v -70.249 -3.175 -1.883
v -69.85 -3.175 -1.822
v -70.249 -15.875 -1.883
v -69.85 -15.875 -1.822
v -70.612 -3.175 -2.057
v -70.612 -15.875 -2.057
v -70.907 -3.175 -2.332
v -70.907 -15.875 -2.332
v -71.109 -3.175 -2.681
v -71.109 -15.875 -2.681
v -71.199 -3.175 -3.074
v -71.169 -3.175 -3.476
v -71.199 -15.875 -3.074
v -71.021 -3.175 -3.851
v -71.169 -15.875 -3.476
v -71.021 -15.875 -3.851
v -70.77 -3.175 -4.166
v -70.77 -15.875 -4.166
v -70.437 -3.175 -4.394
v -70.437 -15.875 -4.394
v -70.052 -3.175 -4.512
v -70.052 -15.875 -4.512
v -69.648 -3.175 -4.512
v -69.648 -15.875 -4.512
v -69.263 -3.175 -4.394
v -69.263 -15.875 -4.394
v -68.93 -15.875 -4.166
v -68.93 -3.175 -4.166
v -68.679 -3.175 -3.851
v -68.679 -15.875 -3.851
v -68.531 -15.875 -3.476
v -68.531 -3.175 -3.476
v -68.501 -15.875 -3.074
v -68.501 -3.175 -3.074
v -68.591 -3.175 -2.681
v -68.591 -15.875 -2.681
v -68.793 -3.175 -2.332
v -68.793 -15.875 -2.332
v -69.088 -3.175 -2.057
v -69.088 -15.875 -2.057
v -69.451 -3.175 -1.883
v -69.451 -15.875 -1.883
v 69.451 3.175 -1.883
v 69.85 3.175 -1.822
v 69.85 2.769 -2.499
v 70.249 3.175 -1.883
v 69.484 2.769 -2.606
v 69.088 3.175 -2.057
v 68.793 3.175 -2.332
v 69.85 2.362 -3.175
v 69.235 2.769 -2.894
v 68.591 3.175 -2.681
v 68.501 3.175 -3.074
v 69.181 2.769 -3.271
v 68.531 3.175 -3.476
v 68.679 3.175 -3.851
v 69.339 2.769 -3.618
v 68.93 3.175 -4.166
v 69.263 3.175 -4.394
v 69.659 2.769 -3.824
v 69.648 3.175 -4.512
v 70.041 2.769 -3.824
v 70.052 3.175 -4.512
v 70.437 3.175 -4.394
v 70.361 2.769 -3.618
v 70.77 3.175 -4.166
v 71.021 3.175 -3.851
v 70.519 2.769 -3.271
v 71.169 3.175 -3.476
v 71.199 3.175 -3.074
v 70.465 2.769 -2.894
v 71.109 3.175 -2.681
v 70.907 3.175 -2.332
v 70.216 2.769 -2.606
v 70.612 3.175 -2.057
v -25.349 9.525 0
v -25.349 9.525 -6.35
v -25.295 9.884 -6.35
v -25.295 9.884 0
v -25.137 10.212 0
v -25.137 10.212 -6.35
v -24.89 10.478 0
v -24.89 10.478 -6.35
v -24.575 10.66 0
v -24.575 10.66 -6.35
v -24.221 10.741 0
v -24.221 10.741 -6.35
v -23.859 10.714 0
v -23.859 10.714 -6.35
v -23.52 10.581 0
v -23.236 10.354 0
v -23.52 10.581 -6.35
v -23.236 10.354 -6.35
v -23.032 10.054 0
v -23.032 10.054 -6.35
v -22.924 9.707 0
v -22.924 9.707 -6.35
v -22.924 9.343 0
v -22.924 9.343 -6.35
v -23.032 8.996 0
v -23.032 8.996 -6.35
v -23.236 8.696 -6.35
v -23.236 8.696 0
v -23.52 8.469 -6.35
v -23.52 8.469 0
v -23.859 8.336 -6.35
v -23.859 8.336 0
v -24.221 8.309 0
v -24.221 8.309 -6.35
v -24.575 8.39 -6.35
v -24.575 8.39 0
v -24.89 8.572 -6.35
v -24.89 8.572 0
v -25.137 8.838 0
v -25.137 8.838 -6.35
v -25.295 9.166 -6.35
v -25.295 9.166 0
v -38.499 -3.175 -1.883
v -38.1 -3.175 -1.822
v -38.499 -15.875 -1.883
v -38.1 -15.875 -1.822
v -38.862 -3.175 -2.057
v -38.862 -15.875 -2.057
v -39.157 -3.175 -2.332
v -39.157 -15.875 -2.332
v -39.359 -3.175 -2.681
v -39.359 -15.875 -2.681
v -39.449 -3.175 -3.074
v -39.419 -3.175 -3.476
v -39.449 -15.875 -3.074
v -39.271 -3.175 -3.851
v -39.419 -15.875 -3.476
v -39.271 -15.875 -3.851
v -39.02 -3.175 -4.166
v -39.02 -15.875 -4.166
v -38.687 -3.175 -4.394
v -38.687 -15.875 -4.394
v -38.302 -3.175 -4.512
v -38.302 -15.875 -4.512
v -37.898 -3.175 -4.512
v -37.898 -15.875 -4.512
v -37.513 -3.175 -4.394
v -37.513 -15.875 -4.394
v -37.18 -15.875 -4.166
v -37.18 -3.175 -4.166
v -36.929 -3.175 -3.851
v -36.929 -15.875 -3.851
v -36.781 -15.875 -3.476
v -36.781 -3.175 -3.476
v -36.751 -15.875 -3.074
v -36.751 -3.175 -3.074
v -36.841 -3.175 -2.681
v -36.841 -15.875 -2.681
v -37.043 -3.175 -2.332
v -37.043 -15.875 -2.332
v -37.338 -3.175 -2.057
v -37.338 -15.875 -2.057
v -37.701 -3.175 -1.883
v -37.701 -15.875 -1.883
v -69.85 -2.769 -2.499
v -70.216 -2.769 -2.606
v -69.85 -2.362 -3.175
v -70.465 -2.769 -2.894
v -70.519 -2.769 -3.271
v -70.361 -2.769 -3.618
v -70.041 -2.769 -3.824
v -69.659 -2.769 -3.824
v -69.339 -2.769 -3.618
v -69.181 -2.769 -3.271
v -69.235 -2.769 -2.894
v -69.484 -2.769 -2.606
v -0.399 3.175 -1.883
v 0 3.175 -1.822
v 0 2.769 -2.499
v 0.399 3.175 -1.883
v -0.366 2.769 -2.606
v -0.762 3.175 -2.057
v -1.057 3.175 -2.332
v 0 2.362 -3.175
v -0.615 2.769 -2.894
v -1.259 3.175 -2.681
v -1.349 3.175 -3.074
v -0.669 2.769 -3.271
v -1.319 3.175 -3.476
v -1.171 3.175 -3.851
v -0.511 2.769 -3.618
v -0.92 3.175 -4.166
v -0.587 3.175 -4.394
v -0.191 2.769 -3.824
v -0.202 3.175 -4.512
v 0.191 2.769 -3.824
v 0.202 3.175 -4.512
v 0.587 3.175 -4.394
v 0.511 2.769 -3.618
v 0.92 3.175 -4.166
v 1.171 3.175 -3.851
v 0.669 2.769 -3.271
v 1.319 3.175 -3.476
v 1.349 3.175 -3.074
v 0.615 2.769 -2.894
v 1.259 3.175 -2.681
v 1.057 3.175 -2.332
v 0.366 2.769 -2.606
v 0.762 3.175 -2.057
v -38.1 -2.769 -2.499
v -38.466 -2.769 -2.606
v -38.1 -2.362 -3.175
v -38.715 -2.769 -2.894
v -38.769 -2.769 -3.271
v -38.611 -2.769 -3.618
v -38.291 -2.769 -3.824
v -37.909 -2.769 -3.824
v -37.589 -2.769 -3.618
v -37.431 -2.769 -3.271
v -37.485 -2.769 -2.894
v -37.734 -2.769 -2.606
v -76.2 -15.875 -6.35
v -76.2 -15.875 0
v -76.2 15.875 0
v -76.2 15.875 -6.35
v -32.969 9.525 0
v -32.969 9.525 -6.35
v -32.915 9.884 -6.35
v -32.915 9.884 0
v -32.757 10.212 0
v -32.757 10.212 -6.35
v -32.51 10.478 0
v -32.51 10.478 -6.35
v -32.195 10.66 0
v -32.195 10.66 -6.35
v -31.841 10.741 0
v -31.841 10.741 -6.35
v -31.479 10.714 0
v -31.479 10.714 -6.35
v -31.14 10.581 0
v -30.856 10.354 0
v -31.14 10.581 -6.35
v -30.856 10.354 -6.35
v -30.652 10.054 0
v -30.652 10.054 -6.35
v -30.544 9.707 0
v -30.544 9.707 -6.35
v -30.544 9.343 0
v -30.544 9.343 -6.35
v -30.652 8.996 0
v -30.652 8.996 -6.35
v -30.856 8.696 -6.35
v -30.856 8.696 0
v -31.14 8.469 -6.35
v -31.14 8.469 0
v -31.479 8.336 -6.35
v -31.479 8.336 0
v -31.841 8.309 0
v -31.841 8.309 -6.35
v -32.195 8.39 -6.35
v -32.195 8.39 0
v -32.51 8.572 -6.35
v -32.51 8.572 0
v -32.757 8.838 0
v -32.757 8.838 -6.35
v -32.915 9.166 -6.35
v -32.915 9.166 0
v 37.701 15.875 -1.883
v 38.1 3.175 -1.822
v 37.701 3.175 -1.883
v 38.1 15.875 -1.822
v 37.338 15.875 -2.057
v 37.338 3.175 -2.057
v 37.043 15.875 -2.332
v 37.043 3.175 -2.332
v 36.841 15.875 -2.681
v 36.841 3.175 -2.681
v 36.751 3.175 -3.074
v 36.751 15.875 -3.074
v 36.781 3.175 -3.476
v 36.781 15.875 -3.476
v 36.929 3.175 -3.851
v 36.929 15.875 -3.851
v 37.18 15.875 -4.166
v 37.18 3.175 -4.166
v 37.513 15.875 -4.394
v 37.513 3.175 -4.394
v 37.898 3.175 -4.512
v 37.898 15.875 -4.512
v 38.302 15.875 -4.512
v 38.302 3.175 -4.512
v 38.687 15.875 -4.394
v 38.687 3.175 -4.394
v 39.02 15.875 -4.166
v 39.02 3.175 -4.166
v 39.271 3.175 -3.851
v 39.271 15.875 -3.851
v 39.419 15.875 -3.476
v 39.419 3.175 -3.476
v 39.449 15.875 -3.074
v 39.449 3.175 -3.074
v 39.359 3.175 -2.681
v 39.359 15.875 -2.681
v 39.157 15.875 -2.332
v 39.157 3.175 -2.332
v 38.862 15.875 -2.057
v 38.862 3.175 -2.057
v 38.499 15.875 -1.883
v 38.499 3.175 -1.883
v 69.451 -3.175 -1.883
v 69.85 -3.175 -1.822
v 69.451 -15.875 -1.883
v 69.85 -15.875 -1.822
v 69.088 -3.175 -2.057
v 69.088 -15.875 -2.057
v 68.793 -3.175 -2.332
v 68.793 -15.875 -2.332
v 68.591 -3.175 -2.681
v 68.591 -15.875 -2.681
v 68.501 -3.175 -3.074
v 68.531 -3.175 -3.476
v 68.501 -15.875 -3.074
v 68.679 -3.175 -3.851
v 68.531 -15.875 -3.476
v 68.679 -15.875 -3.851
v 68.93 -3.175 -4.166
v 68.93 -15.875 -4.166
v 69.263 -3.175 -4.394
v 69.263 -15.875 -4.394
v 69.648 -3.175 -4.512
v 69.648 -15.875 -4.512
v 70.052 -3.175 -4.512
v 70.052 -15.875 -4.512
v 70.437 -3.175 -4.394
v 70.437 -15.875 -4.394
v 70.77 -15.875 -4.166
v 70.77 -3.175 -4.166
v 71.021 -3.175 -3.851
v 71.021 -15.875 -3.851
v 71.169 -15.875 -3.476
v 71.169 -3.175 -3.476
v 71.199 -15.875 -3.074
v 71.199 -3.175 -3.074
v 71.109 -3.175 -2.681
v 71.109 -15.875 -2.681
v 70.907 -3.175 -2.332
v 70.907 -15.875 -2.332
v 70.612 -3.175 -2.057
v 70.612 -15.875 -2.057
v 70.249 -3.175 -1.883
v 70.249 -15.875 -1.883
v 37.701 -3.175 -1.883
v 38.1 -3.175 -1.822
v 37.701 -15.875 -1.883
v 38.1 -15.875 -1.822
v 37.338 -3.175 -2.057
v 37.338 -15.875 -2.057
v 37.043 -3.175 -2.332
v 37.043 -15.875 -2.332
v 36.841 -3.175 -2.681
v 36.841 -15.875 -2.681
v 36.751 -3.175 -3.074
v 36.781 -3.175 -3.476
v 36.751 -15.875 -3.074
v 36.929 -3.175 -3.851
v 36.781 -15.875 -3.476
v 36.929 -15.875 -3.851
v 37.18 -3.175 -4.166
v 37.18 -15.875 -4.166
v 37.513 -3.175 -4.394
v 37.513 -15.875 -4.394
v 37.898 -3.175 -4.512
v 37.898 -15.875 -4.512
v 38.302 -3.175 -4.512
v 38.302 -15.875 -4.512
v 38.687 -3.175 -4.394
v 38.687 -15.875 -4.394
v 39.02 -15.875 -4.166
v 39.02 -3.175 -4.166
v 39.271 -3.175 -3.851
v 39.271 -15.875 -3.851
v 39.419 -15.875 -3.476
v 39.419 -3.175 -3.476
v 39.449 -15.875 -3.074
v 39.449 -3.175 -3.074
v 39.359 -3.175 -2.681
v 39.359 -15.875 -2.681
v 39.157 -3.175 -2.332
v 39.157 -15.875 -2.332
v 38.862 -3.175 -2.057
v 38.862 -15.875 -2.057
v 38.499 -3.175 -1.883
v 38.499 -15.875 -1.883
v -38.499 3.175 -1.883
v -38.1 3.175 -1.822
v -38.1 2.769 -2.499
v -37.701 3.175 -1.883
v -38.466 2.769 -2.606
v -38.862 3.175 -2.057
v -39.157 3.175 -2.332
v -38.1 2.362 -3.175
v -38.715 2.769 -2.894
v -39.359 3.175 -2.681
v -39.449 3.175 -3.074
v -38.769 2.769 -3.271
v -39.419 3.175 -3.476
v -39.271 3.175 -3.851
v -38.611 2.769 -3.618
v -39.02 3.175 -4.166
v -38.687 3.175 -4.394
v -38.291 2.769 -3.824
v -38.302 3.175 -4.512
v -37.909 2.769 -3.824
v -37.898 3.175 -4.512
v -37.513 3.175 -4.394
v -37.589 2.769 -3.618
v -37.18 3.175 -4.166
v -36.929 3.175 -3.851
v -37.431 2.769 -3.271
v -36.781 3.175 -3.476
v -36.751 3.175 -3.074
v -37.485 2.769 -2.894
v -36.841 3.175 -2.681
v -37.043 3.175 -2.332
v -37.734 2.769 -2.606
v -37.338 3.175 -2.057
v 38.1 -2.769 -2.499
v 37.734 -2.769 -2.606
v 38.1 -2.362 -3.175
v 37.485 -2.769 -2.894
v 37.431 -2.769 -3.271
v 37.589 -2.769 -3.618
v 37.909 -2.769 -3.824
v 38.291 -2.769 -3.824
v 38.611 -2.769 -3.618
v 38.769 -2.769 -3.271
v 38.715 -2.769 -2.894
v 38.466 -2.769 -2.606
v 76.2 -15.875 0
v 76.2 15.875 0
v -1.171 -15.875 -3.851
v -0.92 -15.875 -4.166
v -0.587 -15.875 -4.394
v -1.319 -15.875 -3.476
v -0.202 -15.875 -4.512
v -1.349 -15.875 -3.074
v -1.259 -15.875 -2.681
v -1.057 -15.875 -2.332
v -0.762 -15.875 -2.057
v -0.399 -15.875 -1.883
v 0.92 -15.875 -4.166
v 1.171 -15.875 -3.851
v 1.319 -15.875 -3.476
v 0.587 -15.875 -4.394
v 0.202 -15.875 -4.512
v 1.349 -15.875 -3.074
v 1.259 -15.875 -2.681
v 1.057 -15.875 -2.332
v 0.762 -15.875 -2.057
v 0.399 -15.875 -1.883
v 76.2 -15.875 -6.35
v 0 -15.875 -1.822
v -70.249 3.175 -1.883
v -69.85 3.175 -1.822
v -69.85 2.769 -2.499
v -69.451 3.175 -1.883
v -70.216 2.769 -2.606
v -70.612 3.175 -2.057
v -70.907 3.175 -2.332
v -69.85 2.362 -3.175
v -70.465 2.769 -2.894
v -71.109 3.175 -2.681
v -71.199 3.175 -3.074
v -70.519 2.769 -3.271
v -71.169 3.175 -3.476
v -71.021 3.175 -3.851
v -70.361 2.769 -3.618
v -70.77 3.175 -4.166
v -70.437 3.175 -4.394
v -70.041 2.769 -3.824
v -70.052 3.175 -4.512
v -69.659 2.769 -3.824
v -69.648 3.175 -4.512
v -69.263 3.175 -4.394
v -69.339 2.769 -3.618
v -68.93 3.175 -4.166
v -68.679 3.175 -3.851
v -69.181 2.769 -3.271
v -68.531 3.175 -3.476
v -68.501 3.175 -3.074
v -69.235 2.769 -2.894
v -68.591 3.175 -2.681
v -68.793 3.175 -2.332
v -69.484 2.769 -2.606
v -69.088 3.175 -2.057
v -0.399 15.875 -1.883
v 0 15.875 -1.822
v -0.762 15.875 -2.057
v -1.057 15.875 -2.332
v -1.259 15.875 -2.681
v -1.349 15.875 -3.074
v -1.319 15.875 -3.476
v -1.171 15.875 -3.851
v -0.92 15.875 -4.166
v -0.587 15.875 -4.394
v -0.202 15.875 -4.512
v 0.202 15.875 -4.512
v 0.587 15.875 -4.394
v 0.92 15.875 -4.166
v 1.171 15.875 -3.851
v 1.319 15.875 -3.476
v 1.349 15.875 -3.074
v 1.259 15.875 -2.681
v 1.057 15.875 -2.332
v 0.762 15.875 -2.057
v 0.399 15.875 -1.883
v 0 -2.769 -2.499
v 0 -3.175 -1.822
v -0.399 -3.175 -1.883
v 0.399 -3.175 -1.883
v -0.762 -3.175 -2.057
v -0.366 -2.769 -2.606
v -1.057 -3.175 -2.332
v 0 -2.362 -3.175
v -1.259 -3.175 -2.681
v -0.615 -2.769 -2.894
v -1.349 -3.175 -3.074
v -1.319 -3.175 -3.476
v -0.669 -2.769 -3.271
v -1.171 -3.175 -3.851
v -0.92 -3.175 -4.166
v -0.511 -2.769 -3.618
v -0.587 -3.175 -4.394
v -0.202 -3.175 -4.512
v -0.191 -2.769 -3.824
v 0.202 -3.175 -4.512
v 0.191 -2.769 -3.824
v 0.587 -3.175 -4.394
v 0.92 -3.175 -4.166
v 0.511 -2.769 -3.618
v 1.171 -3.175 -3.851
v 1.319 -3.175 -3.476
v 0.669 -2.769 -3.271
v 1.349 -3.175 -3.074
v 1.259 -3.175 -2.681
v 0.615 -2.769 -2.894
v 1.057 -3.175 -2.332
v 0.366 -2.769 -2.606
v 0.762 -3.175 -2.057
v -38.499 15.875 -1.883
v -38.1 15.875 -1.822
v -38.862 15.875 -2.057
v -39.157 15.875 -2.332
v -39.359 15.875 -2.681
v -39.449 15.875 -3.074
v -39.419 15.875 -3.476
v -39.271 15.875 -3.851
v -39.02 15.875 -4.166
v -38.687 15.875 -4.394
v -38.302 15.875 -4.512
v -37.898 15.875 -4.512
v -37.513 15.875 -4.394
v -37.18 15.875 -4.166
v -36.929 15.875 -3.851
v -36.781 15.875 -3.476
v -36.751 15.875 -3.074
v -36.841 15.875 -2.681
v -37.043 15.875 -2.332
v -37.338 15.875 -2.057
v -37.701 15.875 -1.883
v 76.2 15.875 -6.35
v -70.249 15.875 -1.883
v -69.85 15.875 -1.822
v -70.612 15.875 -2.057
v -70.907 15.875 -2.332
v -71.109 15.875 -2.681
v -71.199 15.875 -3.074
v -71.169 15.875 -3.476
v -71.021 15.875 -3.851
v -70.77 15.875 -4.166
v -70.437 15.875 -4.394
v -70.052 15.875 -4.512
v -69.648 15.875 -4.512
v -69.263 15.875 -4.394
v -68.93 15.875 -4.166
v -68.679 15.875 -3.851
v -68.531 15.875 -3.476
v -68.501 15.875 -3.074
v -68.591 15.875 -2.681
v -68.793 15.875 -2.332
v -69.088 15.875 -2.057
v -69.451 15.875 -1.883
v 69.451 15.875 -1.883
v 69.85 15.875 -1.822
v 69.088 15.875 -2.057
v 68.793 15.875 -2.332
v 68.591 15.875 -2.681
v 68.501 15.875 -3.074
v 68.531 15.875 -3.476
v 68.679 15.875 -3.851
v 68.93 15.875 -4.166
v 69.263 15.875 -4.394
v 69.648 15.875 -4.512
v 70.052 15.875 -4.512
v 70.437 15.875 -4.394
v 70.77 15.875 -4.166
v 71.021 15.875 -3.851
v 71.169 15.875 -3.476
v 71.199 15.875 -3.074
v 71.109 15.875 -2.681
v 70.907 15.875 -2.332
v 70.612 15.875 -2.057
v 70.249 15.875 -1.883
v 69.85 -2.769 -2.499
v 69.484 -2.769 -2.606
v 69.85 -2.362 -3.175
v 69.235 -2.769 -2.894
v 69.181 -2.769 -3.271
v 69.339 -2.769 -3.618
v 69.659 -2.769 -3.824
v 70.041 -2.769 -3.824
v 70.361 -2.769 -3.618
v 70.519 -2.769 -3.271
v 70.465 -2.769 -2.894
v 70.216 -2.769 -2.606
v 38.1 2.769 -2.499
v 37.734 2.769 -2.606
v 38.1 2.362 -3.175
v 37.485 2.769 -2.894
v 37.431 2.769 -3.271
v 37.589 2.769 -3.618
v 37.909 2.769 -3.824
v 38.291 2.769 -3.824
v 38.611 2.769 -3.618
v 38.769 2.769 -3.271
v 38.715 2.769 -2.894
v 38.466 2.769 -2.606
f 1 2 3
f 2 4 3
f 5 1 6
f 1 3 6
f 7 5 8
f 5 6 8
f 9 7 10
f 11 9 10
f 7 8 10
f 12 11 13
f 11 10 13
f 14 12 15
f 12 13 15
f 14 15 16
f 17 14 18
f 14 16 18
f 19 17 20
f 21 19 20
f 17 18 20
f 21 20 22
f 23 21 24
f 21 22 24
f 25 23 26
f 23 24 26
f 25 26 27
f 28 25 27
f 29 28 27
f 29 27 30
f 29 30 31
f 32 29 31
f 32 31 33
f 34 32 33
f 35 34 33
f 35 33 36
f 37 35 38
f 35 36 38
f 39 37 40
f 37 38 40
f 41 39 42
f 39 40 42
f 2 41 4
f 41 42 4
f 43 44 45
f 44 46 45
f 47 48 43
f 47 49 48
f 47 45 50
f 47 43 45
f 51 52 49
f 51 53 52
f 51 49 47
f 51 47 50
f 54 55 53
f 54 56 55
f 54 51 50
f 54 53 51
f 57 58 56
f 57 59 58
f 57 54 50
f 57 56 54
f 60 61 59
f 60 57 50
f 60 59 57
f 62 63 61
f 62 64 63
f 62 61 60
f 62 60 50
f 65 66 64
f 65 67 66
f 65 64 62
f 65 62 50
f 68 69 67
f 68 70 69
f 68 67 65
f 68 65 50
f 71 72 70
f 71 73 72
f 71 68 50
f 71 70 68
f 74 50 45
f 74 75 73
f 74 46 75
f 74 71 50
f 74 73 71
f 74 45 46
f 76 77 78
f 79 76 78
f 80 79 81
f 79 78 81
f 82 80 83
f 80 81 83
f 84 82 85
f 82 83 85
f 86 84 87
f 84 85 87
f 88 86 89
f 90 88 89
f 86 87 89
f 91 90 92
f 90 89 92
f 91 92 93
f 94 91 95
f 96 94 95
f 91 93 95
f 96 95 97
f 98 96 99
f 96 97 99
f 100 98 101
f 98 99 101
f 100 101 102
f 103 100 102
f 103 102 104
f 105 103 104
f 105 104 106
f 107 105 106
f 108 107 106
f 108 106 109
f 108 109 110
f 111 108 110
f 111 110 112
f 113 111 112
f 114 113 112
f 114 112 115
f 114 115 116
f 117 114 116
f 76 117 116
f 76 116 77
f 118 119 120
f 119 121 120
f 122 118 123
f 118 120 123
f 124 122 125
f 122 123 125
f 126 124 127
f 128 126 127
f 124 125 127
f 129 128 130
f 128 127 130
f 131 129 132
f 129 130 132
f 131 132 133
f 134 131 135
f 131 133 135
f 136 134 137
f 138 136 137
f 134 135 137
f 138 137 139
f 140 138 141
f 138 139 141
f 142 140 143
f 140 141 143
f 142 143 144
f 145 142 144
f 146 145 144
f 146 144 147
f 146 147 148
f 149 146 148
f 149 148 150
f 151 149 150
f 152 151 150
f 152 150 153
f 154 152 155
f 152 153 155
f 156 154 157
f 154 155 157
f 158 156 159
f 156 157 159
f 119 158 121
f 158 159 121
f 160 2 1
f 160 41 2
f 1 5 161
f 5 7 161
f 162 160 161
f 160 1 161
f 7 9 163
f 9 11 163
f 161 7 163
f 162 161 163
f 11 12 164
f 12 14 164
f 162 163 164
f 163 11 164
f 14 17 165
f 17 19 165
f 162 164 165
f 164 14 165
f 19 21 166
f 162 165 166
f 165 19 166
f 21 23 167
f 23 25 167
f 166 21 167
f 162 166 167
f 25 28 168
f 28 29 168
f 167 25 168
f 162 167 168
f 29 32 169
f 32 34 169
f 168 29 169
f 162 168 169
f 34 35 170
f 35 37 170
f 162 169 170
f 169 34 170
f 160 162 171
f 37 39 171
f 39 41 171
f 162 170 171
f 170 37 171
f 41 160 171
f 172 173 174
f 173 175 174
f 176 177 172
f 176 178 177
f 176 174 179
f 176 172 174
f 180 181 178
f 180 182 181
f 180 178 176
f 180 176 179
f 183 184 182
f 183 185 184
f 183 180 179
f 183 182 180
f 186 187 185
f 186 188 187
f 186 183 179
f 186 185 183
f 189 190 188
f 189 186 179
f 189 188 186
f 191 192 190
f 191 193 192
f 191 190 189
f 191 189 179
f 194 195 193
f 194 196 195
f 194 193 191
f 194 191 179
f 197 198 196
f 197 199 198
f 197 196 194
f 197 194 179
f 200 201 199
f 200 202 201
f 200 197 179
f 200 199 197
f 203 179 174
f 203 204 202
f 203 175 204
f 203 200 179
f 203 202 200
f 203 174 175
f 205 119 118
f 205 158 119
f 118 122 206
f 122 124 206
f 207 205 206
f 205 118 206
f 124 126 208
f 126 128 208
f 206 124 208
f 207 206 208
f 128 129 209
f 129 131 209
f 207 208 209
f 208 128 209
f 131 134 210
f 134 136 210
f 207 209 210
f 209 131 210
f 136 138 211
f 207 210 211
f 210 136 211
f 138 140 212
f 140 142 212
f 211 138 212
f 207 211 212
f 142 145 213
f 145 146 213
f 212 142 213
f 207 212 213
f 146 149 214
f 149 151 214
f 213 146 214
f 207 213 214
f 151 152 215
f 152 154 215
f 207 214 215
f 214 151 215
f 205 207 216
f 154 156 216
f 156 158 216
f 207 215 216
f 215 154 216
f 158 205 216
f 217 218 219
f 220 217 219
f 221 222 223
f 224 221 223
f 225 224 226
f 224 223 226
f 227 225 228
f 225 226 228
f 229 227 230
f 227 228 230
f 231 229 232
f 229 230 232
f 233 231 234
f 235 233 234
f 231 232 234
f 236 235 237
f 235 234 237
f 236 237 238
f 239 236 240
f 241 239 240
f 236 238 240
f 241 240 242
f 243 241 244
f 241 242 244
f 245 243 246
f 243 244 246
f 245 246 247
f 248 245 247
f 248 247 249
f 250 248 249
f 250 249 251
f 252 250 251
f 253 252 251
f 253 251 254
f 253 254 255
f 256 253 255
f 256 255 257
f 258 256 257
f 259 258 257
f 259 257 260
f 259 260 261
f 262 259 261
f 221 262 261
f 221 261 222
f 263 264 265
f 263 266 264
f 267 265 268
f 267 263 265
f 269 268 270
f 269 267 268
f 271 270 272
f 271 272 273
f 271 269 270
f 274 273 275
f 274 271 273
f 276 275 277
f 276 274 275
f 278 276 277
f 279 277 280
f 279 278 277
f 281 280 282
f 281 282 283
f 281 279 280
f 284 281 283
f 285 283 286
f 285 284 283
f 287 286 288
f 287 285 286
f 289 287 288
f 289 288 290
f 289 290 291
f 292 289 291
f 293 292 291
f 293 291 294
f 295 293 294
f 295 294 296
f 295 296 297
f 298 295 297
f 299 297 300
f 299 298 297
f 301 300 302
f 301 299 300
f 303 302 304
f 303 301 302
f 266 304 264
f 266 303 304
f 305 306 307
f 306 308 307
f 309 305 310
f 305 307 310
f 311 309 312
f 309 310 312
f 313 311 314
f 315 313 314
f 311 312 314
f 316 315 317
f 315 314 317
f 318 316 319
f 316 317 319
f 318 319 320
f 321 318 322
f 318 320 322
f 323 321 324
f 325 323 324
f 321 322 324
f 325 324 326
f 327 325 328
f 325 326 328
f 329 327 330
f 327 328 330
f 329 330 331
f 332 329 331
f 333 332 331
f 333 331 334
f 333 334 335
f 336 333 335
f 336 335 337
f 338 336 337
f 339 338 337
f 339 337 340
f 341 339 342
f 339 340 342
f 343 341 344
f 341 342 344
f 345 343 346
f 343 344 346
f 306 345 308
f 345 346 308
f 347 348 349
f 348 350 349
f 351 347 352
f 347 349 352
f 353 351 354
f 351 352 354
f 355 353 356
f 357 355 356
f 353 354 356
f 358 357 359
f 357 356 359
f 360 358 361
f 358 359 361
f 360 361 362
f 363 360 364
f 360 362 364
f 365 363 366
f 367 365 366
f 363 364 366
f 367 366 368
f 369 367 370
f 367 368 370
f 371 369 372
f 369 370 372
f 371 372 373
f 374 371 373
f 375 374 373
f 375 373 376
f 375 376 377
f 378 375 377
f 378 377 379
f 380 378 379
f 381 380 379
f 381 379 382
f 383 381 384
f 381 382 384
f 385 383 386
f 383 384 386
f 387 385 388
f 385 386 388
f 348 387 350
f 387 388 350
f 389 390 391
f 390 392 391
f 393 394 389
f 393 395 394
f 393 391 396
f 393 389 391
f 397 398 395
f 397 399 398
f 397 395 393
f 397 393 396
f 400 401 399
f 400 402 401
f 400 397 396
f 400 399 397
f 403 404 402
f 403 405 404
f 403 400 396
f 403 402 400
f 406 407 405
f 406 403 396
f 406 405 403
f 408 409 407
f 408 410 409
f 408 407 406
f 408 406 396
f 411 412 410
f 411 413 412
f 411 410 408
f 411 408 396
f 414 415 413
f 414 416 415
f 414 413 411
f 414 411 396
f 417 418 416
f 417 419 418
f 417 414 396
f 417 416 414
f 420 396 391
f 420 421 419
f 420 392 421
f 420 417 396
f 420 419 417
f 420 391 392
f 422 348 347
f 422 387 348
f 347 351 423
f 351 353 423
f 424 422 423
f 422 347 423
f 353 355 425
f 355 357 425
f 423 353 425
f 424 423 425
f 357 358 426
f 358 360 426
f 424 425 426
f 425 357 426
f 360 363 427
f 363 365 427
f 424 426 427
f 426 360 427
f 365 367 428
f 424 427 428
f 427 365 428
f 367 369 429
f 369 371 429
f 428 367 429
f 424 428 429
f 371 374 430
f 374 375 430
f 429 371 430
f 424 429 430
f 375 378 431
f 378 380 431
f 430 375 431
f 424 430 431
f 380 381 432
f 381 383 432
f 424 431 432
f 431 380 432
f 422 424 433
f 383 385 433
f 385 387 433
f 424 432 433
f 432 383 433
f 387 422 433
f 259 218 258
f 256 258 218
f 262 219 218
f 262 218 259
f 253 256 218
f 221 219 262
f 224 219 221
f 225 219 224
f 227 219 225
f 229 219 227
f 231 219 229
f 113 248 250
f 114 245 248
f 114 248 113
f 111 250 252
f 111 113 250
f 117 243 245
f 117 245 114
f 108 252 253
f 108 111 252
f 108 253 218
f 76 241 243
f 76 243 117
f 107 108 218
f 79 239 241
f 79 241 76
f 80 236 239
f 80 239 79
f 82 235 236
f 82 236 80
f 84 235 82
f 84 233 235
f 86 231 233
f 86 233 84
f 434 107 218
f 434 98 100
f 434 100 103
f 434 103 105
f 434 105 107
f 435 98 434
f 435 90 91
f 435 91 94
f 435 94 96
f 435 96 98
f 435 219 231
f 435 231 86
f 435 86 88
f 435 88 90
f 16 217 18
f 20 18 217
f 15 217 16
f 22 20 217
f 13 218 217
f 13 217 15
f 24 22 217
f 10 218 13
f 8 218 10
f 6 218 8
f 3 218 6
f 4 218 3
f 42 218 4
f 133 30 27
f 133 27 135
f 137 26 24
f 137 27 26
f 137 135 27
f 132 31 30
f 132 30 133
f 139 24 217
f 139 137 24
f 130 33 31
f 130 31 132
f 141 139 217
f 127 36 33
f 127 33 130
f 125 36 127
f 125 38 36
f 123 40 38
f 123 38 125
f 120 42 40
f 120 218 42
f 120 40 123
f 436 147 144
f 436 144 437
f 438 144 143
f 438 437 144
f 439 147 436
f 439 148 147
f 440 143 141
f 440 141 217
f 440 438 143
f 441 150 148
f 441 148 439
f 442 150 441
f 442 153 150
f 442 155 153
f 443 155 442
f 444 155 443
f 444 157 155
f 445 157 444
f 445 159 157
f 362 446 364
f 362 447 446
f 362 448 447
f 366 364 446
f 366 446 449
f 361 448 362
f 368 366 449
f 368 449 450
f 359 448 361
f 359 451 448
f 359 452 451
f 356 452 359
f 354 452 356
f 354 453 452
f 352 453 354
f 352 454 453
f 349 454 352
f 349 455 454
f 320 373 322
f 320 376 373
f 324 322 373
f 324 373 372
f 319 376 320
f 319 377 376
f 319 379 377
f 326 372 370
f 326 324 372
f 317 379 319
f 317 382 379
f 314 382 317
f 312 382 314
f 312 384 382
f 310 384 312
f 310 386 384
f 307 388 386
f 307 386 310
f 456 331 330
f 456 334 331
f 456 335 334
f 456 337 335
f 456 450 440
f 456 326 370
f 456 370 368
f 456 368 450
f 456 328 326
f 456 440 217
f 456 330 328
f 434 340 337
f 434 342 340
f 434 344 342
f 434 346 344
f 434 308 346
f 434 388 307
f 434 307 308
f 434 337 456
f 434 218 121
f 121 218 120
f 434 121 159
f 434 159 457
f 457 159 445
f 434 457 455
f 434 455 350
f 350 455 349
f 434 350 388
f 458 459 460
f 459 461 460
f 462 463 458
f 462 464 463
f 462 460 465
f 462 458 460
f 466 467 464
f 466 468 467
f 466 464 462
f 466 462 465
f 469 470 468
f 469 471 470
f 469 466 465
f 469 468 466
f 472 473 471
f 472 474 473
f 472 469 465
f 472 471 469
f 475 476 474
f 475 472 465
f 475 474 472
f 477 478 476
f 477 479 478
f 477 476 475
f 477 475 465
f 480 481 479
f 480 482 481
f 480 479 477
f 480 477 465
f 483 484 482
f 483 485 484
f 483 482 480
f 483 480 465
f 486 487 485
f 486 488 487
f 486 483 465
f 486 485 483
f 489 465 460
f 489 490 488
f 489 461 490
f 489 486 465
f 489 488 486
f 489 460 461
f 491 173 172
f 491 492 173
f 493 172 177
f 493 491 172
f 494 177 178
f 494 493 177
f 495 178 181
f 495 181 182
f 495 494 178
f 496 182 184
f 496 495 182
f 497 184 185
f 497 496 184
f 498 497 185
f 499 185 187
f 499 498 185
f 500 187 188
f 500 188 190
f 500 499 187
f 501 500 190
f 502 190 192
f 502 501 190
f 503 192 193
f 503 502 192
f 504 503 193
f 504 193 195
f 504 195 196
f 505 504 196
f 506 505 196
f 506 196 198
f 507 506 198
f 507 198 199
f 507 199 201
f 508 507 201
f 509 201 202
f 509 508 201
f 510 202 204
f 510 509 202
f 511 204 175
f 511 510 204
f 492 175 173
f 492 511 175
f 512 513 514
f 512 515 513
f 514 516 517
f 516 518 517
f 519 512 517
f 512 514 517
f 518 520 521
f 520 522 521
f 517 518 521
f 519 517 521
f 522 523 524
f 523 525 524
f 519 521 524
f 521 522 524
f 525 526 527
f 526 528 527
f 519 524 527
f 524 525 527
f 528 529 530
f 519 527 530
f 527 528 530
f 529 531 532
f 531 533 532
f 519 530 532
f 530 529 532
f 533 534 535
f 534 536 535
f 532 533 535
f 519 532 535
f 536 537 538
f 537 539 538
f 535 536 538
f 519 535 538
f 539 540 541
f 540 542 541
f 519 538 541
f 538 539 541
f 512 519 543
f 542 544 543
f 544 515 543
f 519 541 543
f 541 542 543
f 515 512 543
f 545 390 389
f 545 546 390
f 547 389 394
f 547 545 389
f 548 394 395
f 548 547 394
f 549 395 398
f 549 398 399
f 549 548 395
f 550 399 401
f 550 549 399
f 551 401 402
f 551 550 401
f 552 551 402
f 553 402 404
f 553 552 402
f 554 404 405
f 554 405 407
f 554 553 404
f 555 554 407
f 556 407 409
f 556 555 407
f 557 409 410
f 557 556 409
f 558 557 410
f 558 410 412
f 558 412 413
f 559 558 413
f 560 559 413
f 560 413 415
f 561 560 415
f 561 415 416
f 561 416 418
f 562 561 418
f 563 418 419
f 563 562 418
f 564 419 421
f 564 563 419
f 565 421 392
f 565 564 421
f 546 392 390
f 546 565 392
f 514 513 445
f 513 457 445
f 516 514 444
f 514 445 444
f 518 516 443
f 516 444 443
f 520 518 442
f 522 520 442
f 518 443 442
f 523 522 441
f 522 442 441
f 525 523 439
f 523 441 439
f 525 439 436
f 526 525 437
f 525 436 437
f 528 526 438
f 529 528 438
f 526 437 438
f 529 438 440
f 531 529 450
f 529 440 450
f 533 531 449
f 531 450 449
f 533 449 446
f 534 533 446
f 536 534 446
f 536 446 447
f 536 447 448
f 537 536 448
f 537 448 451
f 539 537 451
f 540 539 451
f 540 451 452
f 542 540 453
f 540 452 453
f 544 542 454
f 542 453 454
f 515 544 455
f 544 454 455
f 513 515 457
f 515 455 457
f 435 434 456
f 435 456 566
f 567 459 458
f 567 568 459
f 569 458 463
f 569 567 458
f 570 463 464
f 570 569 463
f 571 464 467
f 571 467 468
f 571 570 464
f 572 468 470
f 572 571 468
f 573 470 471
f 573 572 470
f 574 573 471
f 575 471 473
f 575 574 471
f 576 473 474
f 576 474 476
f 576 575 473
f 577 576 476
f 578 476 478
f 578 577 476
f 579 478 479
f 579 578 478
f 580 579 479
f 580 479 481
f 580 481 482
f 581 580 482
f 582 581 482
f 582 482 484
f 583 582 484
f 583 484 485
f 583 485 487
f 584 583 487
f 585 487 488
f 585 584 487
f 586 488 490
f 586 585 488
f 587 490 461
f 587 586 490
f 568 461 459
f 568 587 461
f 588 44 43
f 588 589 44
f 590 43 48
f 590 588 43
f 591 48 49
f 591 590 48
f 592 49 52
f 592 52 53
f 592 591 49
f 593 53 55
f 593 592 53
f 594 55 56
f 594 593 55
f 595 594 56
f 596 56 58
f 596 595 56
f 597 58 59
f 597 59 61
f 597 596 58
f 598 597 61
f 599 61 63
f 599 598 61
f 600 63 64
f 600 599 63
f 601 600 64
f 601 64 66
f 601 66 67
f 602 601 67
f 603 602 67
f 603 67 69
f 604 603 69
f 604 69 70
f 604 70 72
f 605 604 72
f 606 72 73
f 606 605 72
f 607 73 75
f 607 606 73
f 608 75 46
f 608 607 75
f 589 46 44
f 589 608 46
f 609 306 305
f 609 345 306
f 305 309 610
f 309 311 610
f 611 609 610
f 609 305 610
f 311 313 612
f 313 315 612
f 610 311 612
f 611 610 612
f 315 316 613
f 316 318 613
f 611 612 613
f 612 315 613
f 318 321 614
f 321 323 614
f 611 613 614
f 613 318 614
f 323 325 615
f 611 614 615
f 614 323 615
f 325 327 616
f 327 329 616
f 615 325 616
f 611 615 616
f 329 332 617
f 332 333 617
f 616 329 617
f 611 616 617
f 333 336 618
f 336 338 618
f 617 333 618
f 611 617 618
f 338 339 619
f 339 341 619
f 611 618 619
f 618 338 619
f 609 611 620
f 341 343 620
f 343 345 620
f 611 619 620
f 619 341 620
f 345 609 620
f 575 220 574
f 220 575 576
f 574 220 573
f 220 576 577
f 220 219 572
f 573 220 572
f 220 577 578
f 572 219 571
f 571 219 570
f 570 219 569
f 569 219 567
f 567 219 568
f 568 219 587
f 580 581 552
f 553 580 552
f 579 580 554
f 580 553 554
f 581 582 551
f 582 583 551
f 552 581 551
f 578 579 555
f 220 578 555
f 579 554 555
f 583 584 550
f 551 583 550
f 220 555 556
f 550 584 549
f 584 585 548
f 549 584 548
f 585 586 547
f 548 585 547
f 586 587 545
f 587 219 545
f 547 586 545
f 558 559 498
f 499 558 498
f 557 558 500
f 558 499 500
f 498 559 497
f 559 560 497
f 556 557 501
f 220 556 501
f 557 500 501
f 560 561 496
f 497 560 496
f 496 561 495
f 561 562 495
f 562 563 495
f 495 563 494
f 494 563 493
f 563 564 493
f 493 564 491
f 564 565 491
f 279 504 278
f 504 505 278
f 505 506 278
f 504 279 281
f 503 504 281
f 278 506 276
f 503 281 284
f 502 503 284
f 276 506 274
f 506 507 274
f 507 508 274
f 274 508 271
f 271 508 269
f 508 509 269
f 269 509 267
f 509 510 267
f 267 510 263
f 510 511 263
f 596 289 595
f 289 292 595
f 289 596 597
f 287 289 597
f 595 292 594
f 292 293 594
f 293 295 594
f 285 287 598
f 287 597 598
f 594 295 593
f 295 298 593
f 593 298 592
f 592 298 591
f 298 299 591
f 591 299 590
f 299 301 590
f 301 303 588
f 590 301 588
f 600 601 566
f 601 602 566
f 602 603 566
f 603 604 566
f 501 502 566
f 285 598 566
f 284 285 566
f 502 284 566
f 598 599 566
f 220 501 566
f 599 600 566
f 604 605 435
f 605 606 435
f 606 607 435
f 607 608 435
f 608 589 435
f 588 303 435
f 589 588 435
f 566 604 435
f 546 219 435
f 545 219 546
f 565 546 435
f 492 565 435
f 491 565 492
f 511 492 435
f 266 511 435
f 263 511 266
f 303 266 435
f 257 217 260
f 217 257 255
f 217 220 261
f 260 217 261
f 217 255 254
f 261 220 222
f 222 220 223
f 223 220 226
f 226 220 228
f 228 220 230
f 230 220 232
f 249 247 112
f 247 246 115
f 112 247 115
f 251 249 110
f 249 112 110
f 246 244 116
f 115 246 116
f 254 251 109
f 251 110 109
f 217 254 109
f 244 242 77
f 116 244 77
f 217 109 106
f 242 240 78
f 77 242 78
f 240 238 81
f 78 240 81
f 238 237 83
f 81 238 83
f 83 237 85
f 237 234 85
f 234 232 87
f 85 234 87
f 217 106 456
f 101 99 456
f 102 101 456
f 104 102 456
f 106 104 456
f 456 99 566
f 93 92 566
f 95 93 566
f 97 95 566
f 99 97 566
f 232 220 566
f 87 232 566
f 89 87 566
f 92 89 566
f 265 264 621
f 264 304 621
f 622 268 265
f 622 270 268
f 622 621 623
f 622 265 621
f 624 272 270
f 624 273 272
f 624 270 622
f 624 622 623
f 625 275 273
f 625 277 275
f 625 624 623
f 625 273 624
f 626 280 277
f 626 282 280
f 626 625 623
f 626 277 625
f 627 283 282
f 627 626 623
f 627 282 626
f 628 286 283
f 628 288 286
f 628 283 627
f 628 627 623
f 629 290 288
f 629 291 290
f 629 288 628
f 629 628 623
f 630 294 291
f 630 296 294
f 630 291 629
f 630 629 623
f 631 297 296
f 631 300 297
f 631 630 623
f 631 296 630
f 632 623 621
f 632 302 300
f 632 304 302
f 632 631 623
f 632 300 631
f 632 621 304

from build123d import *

# Parameters (mm, degrees)
SKETCH1_W                          = 152.4
SKETCH1_H                          = 31.75
BOSS_EXTRUDE1_DEPTH                = 6.35
F_2_CLEARANCE_HOLE1_D              = 2.4384
TAP_DRILL_FOR_6_32_TAP1_AT_2_COUNT = 2
TAP_DRILL_FOR_6_32_TAP1_AT_2_PITCH = 31.75
TAP_DRILL_FOR_6_32_TAP1_AT_3_COUNT = 2
TAP_DRILL_FOR_6_32_TAP1_AT_3_PITCH = 69.85
TAP_DRILL_FOR_6_32_TAP1_AT_4_COUNT = 2
TAP_DRILL_FOR_6_32_TAP1_AT_4_PITCH = 107.95
TAP_DRILL_FOR_6_32_TAP1_AT_5_COUNT = 2
TAP_DRILL_FOR_6_32_TAP1_AT_5_PITCH = 139.7


with BuildPart() as part:
    # Sketch1 → Boss-Extrude1 (new body)
    with BuildSketch(Plane.XY):
        Rectangle(SKETCH1_W, SKETCH1_H)
    extrude(amount=-BOSS_EXTRUDE1_DEPTH)

    # #2 Clearance Hole1 (through all)
    with Locations(Plane.XY):
        with Locations((-31.75, 9.525), (-24.13, 9.525)):
            Hole(F_2_CLEARANCE_HOLE1_D / 2)

    # Sketch7 → Tap Drill for #6-32 Tap1 (revolve, cut)
    with BuildSketch(Plane(origin=(-69.85, 15.875, -3.175), x_dir=(0, 0, 1), z_dir=(1, 0, 0))):
        Polygon((0, 0), (0, 13.51269403), (1.35255, 12.7), (1.35255, 0), align=None)
    tap_drill_for_6_32_tap1 = revolve(axis=Axis((-69.85, 22.225, -3.175), (0, -1, 0)), mode=Mode.SUBTRACT)

    # Tap Drill for #6-32 Tap1 at 2: Tap Drill for #6-32 Tap1 ×2
    with Locations(*[(i * TAP_DRILL_FOR_6_32_TAP1_AT_2_PITCH, 0, 0) for i in range(1, TAP_DRILL_FOR_6_32_TAP1_AT_2_COUNT)]):
        add(tap_drill_for_6_32_tap1, mode=Mode.SUBTRACT)

    # Tap Drill for #6-32 Tap1 at 3: Tap Drill for #6-32 Tap1 ×2
    with Locations(*[(i * TAP_DRILL_FOR_6_32_TAP1_AT_3_PITCH, 0, 0) for i in range(1, TAP_DRILL_FOR_6_32_TAP1_AT_3_COUNT)]):
        add(tap_drill_for_6_32_tap1, mode=Mode.SUBTRACT)

    # Tap Drill for #6-32 Tap1 at 4: Tap Drill for #6-32 Tap1 ×2
    with Locations(*[(i * TAP_DRILL_FOR_6_32_TAP1_AT_4_PITCH, 0, 0) for i in range(1, TAP_DRILL_FOR_6_32_TAP1_AT_4_COUNT)]):
        add(tap_drill_for_6_32_tap1, mode=Mode.SUBTRACT)

    # Tap Drill for #6-32 Tap1 at 5: Tap Drill for #6-32 Tap1 ×2
    with Locations(*[(i * TAP_DRILL_FOR_6_32_TAP1_AT_5_PITCH, 0, 0) for i in range(1, TAP_DRILL_FOR_6_32_TAP1_AT_5_COUNT)]):
        add(tap_drill_for_6_32_tap1, mode=Mode.SUBTRACT)

    # Mirror1: Tap Drill for #6-32 Tap1 across plane
    add(tap_drill_for_6_32_tap1.mirror(Plane.ZX), mode=Mode.SUBTRACT)

    # Mirror1 copy 1 sketch → Mirror1 copy 1 (revolve, cut)
    with BuildSketch(Plane(origin=(-38.1, -15.875, -3.175), x_dir=(0, 0, 1), z_dir=(1, 0, 0))):
        Polygon((0, 0), (0, -13.51269403), (1.35255, -12.7), (1.35255, 0), align=None)
    revolve(axis=Axis((-38.1, -22.225, -3.175), (0, -1, 0)), mode=Mode.SUBTRACT)

    # Mirror1 copy 2 sketch → Mirror1 copy 2 (revolve, cut)
    with BuildSketch(Plane(origin=(0, -15.875, -3.175), x_dir=(0, 0, 1), z_dir=(1, 0, 0))):
        Polygon((0, 0), (0, -13.51269403), (1.35255, -12.7), (1.35255, 0), align=None)
    revolve(axis=Axis((0, -22.225, -3.175), (0, -1, 0)), mode=Mode.SUBTRACT)

    # Mirror1 copy 3 sketch → Mirror1 copy 3 (revolve, cut)
    with BuildSketch(Plane(origin=(38.1, -15.875, -3.175), x_dir=(0, 0, 1), z_dir=(1, 0, 0))):
        Polygon((0, 0), (0, -13.51269403), (1.35255, -12.7), (1.35255, 0), align=None)
    revolve(axis=Axis((38.1, -22.225, -3.175), (0, -1, 0)), mode=Mode.SUBTRACT)

    # Mirror1 copy 4 sketch → Mirror1 copy 4 (revolve, cut)
    with BuildSketch(Plane(origin=(69.85, -15.875, -3.175), x_dir=(0, 0, 1), z_dir=(1, 0, 0))):
        Polygon((0, 0), (0, -13.51269403), (1.35255, -12.7), (1.35255, 0), align=None)
    revolve(axis=Axis((69.85, -22.225, -3.175), (0, -1, 0)), mode=Mode.SUBTRACT)


solid = part.part
